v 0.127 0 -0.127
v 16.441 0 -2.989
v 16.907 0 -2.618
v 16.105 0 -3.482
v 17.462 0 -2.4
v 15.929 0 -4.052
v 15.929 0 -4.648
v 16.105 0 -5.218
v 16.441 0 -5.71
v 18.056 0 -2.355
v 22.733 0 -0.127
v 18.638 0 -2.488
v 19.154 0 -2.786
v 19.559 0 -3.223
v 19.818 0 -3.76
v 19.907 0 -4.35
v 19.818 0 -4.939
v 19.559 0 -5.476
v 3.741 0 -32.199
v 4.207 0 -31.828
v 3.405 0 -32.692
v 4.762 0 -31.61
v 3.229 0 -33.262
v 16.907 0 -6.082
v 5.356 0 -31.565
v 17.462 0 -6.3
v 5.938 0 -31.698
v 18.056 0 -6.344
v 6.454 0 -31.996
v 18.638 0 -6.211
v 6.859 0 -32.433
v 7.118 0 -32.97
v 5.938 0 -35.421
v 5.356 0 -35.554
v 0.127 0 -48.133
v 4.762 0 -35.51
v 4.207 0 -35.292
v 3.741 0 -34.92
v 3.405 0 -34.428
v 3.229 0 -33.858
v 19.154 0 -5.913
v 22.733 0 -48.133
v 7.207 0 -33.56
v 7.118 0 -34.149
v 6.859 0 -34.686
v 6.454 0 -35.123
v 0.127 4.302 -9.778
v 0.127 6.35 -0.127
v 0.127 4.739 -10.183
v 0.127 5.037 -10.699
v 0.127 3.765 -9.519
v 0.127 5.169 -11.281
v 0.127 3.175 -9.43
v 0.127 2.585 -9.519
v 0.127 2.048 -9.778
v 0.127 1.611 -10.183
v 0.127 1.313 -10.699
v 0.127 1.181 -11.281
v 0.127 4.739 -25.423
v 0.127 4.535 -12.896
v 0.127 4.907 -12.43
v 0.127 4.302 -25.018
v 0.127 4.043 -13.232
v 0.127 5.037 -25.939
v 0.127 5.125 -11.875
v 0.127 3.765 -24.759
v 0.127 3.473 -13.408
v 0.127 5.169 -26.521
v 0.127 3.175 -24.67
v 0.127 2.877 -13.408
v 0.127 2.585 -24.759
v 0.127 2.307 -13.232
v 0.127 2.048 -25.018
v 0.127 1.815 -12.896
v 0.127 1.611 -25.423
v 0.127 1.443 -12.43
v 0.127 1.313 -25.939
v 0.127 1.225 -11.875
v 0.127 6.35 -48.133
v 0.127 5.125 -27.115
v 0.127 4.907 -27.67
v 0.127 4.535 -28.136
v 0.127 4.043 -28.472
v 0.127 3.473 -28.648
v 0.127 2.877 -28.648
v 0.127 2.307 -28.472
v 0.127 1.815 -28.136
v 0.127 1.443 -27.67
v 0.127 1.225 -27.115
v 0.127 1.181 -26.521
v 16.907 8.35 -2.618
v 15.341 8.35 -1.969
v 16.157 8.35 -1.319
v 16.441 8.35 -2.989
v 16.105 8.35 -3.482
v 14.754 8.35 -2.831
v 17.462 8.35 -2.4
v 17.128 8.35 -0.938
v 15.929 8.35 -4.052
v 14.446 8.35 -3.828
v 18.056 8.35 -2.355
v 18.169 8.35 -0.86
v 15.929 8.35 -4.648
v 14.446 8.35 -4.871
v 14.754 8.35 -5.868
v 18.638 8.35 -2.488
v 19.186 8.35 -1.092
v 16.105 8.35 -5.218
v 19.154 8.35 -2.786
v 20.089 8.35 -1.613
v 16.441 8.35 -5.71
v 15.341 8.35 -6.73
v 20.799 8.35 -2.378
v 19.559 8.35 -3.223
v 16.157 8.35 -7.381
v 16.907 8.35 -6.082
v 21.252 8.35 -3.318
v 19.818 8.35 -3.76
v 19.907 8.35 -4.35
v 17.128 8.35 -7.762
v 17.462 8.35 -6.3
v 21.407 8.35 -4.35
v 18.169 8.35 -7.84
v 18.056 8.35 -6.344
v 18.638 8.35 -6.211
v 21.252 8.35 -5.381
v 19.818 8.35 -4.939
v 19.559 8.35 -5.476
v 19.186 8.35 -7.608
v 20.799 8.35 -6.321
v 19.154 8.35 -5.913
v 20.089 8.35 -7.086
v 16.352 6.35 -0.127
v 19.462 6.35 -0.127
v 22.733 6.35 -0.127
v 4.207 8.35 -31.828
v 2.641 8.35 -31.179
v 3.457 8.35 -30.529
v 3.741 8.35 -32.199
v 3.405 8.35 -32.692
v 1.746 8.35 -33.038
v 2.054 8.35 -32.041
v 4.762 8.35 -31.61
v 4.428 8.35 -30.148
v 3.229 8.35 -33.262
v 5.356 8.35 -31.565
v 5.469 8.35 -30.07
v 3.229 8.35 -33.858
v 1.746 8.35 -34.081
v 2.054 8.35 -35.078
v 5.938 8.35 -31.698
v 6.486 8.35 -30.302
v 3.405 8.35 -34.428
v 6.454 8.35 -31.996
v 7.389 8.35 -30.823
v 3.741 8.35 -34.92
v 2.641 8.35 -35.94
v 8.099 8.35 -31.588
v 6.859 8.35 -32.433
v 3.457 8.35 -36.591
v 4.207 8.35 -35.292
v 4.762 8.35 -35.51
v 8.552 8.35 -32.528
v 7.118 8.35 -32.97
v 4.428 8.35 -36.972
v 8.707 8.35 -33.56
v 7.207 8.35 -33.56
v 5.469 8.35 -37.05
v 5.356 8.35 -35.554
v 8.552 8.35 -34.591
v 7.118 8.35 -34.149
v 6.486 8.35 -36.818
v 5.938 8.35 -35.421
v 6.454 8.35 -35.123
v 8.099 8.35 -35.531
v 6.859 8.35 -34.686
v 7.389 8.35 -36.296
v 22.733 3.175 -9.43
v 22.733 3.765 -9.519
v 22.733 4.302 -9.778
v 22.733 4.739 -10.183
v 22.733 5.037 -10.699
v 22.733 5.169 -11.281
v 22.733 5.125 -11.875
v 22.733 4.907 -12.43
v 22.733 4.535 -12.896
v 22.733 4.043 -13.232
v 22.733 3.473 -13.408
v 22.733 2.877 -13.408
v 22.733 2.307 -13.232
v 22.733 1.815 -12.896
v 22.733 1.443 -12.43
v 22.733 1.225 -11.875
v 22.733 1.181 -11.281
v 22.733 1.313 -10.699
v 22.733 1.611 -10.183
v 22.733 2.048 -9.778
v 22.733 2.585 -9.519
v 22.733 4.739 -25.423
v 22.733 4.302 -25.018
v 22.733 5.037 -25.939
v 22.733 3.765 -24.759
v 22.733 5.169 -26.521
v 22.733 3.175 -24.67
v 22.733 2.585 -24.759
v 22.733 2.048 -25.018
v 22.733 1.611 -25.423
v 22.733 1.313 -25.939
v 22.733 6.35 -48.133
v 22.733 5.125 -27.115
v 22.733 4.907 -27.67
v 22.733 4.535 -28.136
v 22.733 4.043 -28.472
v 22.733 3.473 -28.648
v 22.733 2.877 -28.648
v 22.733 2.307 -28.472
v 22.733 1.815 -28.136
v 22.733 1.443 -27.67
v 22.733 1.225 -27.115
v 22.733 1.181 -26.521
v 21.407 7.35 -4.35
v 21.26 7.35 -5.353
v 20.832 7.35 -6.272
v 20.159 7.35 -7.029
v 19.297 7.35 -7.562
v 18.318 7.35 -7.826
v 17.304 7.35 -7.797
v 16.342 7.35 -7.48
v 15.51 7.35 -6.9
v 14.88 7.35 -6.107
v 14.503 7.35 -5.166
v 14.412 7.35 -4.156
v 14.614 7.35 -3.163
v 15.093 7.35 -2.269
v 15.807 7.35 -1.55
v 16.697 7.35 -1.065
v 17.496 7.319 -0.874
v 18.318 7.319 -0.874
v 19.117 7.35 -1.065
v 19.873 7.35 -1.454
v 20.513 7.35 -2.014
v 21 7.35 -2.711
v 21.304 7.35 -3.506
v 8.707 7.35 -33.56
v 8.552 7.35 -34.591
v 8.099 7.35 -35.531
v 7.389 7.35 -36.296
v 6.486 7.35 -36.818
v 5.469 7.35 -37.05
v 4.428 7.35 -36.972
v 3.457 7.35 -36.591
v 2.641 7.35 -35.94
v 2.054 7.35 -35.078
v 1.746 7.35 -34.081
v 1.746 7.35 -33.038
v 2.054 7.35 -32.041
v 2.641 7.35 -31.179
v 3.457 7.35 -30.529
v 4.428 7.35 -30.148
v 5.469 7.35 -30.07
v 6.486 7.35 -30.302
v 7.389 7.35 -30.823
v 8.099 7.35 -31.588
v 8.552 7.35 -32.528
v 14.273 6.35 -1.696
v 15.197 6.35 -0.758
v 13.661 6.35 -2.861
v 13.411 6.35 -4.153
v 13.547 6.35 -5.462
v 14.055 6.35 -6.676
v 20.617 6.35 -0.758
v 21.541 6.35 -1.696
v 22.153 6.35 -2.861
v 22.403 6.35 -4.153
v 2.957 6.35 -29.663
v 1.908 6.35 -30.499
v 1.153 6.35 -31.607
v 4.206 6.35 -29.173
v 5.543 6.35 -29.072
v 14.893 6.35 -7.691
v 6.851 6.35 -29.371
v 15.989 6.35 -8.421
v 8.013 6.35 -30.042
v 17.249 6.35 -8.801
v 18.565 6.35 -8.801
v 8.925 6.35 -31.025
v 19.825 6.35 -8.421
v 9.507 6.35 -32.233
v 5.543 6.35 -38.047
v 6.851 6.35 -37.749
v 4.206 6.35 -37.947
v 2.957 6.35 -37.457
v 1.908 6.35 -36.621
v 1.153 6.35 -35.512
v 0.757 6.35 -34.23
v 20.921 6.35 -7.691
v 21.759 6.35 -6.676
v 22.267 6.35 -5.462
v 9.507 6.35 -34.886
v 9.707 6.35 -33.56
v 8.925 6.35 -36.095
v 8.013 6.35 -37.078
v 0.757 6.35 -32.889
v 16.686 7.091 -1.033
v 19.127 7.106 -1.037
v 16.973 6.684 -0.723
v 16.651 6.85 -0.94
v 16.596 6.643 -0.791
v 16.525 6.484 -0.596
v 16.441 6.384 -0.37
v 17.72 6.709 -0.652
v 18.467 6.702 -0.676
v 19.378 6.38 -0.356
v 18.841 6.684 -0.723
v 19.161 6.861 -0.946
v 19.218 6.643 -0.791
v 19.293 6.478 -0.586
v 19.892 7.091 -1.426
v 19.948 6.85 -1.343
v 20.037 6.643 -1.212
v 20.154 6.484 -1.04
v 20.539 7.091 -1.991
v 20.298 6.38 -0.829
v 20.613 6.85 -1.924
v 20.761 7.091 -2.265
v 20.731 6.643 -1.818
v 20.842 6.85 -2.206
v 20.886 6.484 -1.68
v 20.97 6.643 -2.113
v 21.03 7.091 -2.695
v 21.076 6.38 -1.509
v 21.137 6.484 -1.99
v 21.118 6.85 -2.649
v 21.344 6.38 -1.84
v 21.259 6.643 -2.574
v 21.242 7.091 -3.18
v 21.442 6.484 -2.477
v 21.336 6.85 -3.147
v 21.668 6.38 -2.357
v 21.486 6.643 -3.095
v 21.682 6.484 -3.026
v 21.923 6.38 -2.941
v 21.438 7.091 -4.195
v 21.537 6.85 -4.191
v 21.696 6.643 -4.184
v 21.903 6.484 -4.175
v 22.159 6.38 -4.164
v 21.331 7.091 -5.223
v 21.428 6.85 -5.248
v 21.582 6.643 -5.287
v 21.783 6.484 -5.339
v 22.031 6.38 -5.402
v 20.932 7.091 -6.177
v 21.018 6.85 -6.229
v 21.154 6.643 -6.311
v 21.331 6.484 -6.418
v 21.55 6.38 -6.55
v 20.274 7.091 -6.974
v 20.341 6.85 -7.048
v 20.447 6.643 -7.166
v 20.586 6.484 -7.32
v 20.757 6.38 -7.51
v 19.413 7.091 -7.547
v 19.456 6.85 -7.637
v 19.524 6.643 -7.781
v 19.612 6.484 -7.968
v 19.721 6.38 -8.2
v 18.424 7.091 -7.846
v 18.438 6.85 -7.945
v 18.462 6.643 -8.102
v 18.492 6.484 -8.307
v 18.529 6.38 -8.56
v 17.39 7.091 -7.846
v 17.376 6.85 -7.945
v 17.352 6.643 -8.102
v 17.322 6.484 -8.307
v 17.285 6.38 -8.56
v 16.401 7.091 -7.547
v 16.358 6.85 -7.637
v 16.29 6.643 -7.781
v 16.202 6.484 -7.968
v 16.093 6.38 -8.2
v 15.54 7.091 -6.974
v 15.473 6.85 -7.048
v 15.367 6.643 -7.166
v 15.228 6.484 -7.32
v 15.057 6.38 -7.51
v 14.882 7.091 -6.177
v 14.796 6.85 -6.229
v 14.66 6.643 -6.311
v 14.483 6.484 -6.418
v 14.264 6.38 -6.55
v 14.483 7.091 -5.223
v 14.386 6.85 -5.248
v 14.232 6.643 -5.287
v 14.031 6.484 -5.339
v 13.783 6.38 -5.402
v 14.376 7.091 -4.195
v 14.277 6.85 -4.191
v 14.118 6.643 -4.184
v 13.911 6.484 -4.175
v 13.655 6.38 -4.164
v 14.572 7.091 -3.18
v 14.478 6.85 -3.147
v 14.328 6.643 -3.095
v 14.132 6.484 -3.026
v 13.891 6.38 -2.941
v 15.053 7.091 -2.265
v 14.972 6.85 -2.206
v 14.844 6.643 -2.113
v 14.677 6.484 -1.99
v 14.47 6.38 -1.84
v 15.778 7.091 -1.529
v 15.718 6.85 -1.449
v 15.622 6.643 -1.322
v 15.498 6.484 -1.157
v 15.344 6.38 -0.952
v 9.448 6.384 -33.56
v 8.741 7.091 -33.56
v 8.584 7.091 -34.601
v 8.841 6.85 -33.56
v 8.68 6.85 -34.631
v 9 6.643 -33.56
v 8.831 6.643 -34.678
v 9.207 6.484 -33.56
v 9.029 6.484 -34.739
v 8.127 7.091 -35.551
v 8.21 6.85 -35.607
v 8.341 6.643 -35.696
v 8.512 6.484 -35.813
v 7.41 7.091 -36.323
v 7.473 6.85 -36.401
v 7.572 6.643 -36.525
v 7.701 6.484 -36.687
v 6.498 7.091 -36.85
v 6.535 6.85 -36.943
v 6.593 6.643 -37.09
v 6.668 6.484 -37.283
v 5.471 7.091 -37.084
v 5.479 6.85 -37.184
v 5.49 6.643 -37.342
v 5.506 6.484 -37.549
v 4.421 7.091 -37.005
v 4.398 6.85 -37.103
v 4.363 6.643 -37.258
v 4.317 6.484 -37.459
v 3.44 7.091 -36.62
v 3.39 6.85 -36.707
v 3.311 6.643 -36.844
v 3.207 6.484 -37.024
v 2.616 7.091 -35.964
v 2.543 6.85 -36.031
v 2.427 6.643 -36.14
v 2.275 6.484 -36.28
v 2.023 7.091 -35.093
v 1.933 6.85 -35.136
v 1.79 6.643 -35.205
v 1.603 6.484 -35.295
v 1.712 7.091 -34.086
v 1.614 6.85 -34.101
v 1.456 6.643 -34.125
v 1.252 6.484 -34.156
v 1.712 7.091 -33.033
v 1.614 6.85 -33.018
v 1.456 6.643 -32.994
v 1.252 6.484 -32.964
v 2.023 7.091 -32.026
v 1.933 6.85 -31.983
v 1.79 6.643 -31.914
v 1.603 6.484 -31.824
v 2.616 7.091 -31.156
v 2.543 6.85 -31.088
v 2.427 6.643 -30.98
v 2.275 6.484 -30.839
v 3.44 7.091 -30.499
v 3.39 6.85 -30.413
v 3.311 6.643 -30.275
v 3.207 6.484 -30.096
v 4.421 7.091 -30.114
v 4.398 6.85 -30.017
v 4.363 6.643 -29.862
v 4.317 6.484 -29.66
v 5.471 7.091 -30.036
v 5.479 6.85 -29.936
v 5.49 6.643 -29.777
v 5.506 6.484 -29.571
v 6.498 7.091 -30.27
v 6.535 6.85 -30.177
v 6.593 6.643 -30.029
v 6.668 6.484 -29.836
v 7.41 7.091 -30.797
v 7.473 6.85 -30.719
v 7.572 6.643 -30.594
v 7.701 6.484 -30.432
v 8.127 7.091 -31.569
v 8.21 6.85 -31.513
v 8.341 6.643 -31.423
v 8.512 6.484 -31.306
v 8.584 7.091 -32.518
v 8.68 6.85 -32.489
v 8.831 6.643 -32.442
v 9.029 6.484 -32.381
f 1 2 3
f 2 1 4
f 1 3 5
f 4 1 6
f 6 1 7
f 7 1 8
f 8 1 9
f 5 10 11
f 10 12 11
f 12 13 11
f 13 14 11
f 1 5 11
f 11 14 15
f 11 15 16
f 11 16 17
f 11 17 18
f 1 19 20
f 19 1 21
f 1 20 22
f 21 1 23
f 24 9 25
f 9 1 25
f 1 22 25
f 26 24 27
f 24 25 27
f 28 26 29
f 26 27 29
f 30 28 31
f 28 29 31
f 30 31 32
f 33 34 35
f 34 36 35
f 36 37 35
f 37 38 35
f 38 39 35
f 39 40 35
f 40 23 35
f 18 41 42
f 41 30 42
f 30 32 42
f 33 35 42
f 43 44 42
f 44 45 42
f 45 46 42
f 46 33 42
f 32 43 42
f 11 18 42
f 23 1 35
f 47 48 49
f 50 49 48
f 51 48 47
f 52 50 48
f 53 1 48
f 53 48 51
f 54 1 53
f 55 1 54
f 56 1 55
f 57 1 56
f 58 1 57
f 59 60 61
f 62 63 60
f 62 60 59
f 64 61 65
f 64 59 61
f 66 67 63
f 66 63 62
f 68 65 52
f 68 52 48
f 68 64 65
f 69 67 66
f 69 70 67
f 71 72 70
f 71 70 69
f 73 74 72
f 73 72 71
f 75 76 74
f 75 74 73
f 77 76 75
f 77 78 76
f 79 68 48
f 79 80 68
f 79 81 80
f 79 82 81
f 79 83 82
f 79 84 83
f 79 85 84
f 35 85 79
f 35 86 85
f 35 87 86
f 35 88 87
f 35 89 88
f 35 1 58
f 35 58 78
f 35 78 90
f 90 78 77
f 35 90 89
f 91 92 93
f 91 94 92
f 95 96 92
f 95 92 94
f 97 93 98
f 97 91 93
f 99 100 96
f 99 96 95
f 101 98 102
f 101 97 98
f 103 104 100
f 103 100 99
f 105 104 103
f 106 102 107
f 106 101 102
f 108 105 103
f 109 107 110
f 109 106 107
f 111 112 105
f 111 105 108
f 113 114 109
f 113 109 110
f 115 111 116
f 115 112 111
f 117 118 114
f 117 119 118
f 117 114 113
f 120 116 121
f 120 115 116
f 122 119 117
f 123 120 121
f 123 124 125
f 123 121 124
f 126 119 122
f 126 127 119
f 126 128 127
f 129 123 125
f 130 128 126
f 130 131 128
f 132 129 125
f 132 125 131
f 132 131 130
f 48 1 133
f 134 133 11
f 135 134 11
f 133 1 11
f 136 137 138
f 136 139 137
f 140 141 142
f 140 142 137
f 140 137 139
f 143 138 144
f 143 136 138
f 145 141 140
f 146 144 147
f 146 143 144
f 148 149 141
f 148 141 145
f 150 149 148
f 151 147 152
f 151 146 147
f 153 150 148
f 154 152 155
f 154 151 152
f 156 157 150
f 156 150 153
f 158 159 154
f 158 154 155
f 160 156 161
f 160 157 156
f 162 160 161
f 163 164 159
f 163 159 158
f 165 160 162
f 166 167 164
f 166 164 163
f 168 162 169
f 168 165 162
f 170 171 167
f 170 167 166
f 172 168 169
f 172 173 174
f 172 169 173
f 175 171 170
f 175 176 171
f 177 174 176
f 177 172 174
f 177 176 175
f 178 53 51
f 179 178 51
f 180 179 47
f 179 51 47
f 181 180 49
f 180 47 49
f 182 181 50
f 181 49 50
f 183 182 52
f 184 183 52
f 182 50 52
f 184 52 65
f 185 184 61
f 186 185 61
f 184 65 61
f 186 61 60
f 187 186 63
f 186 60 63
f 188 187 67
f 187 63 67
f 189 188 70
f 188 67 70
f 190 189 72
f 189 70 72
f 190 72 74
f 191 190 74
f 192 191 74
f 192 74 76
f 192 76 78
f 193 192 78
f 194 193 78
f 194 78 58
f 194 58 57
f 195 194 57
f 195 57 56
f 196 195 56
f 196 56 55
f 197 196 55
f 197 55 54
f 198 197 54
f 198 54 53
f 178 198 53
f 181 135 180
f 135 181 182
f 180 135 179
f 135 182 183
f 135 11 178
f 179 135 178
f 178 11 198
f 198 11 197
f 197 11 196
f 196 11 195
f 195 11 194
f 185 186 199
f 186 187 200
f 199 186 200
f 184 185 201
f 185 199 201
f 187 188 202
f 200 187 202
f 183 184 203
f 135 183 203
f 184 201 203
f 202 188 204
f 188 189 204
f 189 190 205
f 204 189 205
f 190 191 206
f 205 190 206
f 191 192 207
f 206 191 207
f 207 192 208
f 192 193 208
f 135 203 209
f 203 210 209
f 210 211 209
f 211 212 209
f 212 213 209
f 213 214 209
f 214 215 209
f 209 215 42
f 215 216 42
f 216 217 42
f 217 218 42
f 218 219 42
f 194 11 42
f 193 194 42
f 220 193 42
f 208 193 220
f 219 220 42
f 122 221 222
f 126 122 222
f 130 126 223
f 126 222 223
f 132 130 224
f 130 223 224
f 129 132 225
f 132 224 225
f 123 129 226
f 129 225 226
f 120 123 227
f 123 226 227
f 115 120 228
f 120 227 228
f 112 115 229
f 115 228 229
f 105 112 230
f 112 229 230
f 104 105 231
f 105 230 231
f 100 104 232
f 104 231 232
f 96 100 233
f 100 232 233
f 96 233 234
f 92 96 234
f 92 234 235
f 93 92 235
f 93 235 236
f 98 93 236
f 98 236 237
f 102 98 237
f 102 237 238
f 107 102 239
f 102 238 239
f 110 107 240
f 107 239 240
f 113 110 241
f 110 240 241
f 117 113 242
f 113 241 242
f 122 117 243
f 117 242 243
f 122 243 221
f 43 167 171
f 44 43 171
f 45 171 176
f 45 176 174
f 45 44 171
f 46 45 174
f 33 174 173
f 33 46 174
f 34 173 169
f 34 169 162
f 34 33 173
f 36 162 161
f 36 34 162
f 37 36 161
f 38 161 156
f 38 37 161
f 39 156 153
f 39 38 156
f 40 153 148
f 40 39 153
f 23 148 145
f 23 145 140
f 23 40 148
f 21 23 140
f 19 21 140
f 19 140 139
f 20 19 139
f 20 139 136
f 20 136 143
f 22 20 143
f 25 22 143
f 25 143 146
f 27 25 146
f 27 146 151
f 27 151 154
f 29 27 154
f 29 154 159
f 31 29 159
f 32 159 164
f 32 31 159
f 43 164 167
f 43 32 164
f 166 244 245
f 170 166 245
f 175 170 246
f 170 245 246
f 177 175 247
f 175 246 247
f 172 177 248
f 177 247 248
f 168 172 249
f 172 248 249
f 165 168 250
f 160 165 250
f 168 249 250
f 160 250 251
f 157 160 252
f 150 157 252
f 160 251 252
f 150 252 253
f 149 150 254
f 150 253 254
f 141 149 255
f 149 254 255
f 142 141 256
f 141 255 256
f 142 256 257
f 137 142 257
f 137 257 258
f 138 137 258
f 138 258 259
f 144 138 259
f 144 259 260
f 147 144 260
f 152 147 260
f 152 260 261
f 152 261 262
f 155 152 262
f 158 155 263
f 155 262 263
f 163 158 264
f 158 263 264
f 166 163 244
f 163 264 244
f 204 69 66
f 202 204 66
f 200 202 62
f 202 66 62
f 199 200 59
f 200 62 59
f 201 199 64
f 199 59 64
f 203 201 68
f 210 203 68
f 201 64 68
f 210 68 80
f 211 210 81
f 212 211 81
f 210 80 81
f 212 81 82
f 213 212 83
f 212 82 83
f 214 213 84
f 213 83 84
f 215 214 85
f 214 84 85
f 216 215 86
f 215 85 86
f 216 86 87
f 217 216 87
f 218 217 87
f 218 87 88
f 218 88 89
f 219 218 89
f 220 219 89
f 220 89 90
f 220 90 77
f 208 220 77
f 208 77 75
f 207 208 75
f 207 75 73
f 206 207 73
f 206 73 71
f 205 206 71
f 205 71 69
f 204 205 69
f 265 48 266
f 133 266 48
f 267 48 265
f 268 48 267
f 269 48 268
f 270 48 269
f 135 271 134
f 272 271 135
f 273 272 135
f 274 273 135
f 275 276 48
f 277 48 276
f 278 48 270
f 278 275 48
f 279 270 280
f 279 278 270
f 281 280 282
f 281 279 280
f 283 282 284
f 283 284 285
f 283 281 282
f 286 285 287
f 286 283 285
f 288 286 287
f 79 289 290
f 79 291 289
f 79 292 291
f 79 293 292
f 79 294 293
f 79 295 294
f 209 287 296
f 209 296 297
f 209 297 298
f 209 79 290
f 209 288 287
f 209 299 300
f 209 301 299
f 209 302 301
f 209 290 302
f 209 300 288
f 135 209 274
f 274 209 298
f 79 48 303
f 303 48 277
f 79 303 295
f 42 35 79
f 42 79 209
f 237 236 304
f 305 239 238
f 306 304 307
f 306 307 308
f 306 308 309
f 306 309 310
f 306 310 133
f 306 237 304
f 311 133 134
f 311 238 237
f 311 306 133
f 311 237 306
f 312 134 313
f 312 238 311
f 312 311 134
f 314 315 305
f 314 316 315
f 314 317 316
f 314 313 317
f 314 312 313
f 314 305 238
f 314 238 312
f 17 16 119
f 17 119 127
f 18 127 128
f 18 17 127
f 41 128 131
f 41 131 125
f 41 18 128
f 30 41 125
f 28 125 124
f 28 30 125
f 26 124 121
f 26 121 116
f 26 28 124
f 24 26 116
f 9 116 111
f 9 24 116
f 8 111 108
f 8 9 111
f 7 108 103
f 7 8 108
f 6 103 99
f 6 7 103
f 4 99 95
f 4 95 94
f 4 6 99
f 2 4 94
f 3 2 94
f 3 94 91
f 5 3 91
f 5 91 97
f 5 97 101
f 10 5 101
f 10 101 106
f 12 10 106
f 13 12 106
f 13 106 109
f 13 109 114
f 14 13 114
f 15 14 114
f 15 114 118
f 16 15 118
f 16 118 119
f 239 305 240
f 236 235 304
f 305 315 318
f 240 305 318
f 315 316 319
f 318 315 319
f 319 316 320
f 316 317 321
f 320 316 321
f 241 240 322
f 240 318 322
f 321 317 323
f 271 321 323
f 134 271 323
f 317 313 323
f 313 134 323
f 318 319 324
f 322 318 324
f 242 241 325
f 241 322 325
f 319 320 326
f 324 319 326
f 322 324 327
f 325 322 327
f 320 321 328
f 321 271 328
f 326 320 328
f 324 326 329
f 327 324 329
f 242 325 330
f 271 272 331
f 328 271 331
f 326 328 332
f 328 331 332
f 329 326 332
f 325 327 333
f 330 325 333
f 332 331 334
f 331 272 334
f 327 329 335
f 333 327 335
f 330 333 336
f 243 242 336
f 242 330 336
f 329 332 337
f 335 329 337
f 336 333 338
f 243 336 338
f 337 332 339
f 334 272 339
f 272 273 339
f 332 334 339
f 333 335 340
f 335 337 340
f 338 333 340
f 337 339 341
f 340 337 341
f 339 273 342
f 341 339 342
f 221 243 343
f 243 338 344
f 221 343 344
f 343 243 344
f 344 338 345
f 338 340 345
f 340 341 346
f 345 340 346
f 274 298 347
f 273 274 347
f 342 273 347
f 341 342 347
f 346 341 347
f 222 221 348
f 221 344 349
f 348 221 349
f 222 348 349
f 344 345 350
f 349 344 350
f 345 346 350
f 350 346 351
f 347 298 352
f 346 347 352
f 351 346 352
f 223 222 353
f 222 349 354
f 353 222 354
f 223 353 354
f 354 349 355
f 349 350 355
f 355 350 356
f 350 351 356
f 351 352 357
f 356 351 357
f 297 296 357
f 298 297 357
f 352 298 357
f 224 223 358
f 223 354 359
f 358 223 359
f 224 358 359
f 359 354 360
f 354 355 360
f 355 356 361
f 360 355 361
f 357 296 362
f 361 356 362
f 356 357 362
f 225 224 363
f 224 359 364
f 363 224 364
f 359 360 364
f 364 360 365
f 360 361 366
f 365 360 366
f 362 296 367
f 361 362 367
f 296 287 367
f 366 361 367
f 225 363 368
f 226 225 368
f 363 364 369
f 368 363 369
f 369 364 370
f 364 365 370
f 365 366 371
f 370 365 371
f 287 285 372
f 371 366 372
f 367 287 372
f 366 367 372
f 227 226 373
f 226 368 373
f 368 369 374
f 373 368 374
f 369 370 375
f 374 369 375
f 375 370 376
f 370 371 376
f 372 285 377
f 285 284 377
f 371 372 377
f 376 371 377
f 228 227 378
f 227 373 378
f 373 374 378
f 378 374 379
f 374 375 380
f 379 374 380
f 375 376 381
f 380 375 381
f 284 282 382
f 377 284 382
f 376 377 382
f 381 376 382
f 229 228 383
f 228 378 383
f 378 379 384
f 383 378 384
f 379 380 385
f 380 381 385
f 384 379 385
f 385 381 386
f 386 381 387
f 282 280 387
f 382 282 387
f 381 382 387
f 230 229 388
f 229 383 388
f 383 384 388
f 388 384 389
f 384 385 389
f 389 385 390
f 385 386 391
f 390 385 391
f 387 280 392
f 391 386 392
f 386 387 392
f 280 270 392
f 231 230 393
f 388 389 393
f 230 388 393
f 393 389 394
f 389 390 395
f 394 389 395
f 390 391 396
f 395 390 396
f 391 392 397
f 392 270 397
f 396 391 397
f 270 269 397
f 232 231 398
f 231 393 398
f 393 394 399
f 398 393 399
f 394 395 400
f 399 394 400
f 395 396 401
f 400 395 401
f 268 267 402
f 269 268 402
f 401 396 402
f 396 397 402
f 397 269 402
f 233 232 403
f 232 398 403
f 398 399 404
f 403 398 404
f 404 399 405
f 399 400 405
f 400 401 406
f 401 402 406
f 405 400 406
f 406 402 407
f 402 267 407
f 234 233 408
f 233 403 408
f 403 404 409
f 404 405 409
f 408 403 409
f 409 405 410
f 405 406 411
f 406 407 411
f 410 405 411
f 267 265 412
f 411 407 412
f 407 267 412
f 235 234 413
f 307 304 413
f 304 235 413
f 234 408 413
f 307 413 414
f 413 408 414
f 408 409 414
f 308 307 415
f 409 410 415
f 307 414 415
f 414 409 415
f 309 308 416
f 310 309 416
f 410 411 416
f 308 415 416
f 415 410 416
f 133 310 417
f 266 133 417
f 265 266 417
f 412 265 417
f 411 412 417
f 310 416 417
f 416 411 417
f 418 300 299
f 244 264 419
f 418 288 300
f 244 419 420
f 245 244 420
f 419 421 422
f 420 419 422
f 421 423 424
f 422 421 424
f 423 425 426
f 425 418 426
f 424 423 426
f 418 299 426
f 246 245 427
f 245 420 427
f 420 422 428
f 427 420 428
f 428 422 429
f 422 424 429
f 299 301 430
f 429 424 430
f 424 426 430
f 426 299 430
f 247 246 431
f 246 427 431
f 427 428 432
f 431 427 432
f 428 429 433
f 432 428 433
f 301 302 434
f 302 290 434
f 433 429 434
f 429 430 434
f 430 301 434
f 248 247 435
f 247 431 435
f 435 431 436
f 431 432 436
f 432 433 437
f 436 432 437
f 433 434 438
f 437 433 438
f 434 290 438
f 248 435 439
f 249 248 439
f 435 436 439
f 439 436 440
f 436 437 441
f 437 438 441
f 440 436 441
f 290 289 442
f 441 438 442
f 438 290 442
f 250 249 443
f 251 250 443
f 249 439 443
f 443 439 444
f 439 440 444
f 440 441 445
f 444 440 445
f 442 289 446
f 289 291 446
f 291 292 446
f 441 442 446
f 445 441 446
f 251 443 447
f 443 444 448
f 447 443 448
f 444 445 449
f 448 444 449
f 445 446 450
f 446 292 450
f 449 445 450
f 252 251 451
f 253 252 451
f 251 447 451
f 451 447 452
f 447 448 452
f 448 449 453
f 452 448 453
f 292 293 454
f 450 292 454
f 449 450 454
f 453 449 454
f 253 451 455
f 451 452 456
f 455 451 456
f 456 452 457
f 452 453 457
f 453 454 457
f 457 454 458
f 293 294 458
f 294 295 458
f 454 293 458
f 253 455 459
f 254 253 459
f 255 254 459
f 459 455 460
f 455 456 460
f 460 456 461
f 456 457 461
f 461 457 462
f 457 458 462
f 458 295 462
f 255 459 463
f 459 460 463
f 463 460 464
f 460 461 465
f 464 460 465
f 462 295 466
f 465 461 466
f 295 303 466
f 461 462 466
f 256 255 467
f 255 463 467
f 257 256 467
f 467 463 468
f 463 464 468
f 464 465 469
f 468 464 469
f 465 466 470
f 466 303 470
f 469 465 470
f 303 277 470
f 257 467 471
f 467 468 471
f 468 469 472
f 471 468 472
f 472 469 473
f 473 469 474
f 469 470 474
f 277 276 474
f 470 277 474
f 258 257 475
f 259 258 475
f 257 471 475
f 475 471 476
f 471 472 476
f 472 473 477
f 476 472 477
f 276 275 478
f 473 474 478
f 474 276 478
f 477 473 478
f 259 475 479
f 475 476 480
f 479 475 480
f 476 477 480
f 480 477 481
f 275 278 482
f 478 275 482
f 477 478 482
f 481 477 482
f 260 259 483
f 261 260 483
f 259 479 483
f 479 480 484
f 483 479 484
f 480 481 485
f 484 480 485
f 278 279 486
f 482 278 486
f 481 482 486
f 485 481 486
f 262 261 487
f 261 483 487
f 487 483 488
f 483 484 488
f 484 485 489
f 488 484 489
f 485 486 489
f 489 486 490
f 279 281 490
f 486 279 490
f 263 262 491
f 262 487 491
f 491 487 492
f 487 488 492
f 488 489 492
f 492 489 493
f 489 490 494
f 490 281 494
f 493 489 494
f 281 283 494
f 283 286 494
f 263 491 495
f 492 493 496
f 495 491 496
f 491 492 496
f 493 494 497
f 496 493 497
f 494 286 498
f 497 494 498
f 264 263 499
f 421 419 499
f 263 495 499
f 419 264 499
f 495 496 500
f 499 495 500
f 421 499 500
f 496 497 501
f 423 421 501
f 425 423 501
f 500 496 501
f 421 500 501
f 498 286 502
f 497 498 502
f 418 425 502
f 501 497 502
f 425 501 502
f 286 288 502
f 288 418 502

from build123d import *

# Parameters (mm, degrees)
SKETCH1_W           = 22.606
SKETCH1_H           = 48.006
SKETCH1_R           = 2
BOSS_EXTRUDE1_DEPTH = 6.35
SKETCH2_R           = 2
CUT_EXTRUDE1_DEPTH  = 23.606
SKETCH3_R           = 3.5
SKETCH3_R_2         = 2
BOSS_EXTRUDE2_DEPTH = 2
FILLET1_R           = 1


with BuildPart() as part:
    # Sketch1 → Boss-Extrude1 (new body)
    with BuildSketch(Plane(origin=(0, 0, 0), x_dir=(1, 0, 0), z_dir=(0, 1, 0))):
        with Locations((11.43, 24.13)):
            Rectangle(SKETCH1_W, SKETCH1_H)
        with Locations((5.207, 33.55975)):
            Circle(SKETCH1_R, mode=Mode.SUBTRACT)
        with Locations((17.907, 4.34975)):
            Circle(SKETCH1_R, mode=Mode.SUBTRACT)
    extrude(amount=BOSS_EXTRUDE1_DEPTH)

    # Sketch2 → Cut-Extrude1 (cut, through all)
    with BuildSketch(Plane.ZY.offset(-0.127)):
        with Locations((-26.67, 3.175)):
            Circle(SKETCH2_R)
        with Locations((-11.43, 3.175)):
            Circle(SKETCH2_R)
    extrude(amount=-CUT_EXTRUDE1_DEPTH, mode=Mode.SUBTRACT)

    # Sketch3 → Boss-Extrude2 (add)
    with BuildSketch(Plane(origin=(0, 6.35, 0), x_dir=(1, 0, 0), z_dir=(0, 1, 0))):
        with Locations((5.207, 33.55975)):
            Circle(SKETCH3_R)
        with Locations((5.207, 33.55975)):
            Circle(SKETCH3_R_2, mode=Mode.SUBTRACT)
        with Locations((17.907, 4.34975)):
            Circle(SKETCH3_R)
        with Locations((17.907, 4.34975)):
            Circle(SKETCH3_R_2, mode=Mode.SUBTRACT)
    extrude(amount=BOSS_EXTRUDE2_DEPTH)

    # Fillet1
    fillet1_edges = [part.edges().sort_by_distance(p)[0] for p in [
        (1.707, 6.35, -33.55975),
        (14.407, 6.35, -4.34975),
    ]]
    fillet(fillet1_edges, radius=FILLET1_R)


solid = part.part
